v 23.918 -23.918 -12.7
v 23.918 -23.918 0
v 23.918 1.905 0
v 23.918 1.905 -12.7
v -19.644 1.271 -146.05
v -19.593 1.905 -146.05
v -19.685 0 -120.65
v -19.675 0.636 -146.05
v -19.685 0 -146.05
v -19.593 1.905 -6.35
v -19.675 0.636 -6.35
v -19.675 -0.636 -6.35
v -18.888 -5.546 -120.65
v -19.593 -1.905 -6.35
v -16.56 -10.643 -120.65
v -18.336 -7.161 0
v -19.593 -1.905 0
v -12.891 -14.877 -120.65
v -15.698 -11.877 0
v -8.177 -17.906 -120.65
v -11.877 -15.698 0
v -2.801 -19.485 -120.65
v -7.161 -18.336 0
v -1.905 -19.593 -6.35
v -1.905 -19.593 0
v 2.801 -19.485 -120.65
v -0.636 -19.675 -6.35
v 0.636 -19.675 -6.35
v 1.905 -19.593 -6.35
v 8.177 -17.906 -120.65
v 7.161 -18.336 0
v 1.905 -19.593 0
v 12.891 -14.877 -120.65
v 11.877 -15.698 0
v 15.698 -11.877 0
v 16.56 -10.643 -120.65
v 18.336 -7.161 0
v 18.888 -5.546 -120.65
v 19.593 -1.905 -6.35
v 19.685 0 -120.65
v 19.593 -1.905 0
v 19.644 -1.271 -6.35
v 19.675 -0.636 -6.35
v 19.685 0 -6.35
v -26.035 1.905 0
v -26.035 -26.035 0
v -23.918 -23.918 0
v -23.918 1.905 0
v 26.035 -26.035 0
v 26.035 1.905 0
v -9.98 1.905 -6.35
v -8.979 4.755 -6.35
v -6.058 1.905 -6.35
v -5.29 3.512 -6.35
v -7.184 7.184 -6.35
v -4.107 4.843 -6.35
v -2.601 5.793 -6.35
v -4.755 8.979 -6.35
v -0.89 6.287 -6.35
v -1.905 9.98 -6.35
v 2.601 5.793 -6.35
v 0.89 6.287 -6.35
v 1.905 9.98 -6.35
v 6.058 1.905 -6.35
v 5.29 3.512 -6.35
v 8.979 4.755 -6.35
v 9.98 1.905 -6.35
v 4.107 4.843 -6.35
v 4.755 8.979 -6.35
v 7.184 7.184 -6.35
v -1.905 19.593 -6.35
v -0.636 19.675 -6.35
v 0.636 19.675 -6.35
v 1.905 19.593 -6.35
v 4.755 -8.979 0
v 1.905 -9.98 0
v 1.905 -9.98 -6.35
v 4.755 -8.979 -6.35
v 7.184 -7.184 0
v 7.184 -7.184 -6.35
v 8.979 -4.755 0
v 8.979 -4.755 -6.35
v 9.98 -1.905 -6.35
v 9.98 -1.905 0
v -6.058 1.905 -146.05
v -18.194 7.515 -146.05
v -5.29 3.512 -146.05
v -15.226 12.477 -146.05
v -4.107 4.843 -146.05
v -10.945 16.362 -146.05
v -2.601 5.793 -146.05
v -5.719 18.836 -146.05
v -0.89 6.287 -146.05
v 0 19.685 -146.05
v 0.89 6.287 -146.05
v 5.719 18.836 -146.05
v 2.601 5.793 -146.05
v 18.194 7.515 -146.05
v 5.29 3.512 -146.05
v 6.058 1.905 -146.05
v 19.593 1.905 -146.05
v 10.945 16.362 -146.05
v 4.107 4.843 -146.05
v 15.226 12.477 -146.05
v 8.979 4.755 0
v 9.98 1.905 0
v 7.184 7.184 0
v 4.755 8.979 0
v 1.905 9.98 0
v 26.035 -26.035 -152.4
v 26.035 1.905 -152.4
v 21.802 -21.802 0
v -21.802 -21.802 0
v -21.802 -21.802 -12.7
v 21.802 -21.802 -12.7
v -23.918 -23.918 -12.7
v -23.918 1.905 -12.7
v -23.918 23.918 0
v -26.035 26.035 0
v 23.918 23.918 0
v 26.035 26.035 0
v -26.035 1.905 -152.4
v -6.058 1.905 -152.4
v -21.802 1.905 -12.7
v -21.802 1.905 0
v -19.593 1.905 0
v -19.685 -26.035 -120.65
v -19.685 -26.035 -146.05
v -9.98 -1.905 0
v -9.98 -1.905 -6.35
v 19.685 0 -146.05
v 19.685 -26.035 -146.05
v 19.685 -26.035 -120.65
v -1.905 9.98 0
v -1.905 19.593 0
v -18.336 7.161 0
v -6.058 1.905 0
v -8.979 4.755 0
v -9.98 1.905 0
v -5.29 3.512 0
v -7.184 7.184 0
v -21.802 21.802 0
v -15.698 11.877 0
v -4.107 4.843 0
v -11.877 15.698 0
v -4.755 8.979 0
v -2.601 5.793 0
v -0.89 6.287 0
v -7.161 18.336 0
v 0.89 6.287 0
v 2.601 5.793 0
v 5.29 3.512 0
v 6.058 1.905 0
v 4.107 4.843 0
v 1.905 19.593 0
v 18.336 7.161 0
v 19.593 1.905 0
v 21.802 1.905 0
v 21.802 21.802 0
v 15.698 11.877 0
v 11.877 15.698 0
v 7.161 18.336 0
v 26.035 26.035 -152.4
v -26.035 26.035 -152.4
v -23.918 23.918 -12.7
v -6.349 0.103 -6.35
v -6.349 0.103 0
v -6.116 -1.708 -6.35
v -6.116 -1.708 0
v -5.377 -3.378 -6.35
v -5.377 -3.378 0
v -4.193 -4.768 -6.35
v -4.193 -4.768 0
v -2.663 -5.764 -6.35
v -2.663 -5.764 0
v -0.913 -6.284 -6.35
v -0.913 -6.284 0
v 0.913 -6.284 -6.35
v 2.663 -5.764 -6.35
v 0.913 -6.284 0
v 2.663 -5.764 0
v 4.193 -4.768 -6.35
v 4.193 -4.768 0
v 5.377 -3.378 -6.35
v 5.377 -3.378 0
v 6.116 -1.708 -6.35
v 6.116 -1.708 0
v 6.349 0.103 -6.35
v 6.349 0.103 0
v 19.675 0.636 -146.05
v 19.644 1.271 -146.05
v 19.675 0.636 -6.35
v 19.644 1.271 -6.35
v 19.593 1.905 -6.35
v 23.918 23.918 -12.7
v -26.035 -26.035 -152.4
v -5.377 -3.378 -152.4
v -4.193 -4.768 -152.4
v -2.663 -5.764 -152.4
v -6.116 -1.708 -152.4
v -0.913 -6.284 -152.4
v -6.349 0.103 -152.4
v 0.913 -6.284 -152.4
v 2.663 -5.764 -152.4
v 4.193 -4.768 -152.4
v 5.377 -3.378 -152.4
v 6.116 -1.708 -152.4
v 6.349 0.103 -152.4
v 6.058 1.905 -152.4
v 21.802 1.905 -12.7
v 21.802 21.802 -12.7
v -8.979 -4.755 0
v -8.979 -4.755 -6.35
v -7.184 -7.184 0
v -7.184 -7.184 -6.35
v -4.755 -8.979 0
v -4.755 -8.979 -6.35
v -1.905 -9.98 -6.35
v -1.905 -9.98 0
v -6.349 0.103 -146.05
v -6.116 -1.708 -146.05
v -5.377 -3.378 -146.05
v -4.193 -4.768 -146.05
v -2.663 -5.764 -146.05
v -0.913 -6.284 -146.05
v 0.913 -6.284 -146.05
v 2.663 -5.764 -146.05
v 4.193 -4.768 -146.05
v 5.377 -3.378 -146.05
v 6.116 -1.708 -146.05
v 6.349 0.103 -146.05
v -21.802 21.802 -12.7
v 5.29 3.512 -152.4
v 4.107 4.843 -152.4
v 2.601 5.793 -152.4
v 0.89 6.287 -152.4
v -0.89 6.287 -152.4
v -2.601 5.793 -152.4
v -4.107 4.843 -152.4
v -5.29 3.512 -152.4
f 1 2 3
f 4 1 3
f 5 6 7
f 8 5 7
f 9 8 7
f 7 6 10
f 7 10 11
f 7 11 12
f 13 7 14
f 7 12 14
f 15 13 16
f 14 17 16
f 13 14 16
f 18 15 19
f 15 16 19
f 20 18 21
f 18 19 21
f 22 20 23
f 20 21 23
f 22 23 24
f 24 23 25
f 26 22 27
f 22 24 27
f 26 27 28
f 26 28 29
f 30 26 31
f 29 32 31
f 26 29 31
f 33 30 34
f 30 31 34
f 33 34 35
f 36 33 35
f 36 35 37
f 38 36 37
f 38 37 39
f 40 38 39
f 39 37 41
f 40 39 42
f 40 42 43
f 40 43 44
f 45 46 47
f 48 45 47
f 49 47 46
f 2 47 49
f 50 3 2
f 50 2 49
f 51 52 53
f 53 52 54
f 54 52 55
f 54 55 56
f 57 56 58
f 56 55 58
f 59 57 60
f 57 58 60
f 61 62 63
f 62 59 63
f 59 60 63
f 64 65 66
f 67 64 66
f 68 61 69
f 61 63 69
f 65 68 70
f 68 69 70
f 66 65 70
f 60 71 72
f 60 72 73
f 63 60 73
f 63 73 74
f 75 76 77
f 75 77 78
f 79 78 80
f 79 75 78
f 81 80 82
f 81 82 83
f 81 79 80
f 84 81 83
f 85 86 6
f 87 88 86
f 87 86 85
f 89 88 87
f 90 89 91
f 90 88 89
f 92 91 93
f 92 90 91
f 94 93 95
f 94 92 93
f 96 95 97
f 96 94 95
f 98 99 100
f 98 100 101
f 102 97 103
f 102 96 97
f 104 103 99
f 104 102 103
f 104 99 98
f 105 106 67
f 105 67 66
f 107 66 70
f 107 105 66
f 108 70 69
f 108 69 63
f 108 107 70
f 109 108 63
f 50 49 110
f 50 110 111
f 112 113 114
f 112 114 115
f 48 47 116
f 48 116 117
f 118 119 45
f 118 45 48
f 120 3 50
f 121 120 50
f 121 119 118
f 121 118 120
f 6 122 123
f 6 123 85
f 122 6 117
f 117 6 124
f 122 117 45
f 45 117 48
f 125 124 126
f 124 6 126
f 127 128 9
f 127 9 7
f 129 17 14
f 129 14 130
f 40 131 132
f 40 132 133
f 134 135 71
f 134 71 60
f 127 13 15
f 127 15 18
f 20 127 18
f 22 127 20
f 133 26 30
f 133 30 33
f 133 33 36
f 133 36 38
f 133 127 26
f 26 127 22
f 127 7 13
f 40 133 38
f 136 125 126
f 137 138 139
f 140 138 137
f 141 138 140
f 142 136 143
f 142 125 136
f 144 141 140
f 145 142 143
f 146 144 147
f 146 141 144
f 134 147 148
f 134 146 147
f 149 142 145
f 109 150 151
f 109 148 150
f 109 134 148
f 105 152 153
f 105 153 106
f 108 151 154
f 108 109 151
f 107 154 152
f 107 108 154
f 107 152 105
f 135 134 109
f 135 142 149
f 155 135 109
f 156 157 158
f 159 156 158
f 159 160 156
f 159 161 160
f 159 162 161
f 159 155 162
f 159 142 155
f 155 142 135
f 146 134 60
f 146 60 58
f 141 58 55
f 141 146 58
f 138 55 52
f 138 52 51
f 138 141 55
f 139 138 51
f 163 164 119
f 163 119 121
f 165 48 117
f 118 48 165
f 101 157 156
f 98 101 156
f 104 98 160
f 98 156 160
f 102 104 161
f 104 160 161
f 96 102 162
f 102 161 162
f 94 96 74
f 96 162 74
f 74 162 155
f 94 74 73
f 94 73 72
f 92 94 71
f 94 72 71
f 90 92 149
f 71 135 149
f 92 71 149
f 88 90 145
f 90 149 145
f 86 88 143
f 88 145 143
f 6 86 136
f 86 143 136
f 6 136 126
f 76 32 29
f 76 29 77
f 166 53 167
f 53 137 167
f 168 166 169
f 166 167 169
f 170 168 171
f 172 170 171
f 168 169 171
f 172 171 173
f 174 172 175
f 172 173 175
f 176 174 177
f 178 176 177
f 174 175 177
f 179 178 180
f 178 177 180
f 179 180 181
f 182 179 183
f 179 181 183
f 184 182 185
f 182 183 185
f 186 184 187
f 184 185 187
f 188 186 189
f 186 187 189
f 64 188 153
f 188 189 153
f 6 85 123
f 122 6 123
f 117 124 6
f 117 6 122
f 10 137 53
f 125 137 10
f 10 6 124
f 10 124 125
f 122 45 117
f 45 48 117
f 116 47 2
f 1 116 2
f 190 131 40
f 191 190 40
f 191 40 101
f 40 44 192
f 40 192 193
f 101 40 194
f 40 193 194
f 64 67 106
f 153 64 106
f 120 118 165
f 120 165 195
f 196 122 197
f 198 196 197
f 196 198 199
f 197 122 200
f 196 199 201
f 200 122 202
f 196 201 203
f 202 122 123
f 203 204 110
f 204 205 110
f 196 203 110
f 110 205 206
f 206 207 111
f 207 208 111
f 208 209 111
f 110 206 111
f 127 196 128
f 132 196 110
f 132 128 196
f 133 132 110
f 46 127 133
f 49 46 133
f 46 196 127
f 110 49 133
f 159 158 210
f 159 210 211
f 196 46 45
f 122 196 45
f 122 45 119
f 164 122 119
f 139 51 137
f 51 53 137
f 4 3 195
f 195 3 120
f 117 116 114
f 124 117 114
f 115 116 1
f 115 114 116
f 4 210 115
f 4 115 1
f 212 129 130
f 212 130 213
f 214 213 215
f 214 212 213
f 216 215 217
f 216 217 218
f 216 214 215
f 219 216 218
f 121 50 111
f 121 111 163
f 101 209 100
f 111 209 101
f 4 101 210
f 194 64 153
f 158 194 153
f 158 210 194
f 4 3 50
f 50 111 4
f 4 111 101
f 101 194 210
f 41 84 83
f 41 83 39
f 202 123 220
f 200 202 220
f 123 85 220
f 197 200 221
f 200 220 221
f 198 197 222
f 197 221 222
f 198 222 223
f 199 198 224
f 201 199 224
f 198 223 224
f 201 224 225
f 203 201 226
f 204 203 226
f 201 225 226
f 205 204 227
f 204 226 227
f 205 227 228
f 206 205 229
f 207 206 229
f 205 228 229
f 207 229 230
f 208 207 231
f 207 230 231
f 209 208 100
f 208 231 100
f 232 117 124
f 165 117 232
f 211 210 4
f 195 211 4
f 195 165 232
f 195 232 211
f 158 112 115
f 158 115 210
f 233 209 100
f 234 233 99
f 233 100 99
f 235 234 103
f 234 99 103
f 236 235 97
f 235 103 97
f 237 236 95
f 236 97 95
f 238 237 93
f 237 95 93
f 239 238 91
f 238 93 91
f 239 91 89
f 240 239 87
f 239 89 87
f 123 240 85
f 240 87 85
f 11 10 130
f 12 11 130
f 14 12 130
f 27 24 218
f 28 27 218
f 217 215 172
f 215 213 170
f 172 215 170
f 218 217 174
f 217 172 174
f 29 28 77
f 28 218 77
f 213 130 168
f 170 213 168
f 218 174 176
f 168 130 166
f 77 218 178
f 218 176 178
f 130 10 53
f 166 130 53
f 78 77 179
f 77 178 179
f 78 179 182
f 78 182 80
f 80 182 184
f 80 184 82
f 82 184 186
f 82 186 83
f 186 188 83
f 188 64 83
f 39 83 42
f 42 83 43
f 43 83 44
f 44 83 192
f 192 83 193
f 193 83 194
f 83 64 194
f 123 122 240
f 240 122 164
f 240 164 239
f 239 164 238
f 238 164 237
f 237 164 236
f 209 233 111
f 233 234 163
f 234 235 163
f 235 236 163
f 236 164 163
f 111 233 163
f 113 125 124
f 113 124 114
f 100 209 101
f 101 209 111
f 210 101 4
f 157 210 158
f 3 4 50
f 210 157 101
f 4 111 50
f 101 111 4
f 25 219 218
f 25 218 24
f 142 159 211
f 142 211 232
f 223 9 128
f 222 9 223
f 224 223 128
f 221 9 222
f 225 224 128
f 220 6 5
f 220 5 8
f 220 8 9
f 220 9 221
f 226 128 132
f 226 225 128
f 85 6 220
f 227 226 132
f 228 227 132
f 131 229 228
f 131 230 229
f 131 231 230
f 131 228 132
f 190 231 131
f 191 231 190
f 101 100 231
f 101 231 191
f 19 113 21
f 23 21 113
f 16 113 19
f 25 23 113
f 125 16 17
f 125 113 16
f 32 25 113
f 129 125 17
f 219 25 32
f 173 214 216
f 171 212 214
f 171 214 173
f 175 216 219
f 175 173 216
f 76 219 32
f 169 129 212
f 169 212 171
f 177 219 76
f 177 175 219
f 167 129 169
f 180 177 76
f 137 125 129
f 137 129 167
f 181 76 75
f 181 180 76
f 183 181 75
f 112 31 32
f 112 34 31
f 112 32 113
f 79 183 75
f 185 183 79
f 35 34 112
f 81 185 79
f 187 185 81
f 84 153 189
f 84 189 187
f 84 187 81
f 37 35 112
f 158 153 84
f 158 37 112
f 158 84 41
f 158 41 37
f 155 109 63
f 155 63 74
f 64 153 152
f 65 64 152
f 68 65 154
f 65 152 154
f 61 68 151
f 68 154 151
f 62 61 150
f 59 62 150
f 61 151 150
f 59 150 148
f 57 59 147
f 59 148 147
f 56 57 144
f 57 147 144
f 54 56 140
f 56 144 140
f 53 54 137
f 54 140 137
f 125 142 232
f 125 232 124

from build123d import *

# Parameters (mm, degrees)
SKETCH2_W           = 52.07
SKETCH2_H           = 52.07
BOSS_EXTRUDE1_DEPTH = 152.4
SKETCH3_W           = 47.8366836
SKETCH3_H           = 47.8366836
SKETCH3_W_2         = 43.6035196
SKETCH3_H_2         = 43.6035196
CUT_EXTRUDE1_DEPTH  = 12.7
SKETCH4_R           = 19.685
CUT_EXTRUDE2_DEPTH  = 146.05
BOSS_EXTRUDE2_DEPTH = 6.35
SKETCH6_R           = 6.35
CUT_EXTRUDE3_DEPTH  = 157.78457338
SKETCH7_W           = 39.37
SKETCH7_H           = 25.4
CUT_EXTRUDE4_DEPTH  = 26.035


with BuildPart() as part:
    # Sketch2 → Boss-Extrude1 (new body)
    with BuildSketch(Plane.XY):
        Rectangle(SKETCH2_W, SKETCH2_H)
    extrude(amount=-BOSS_EXTRUDE1_DEPTH)

    # Sketch3 → Cut-Extrude1 (cut)
    with BuildSketch(Plane.XY):
        Rectangle(SKETCH3_W, SKETCH3_H)
        Rectangle(SKETCH3_W_2, SKETCH3_H_2, mode=Mode.SUBTRACT)
    extrude(amount=-CUT_EXTRUDE1_DEPTH, mode=Mode.SUBTRACT)

    # Sketch4 → Cut-Extrude2 (cut)
    with BuildSketch(Plane.XY):
        Circle(SKETCH4_R)
    extrude(amount=-CUT_EXTRUDE2_DEPTH, mode=Mode.SUBTRACT)

    # Sketch5 → Boss-Extrude2 (add)
    with BuildSketch(Plane.XY):
        with BuildLine():
            ThreePointArc((-19.592605748, -1.905), (-19.685, 0), (-19.592605748, 1.905))
            Line((-19.592605748, 1.905), (-21.8017598, 1.905))
            Line((-21.8017598, 1.905), (-21.8017598, -1.905))
            Line((-21.8017598, -1.905), (-19.592605748, -1.905))
        make_face()
        with BuildLine():
            Line((-9.979808365, 1.905), (-19.592605748, 1.905))
            ThreePointArc((-19.592605748, 1.905), (-19.685, 0), (-19.592605748, -1.905))
            Line((-19.592605748, -1.905), (-9.979808365, -1.905))
            ThreePointArc((-9.979808365, -1.905), (-10.16, 0), (-9.979808365, 1.905))
        make_face()
        with BuildLine():
            Line((-1.905, -1.905), (-1.905, 1.905))
            Line((-1.905, 1.905), (-9.979808365, 1.905))
            ThreePointArc((-9.979808365, 1.905), (-10.16, 0), (-9.979808365, -1.905))
            Line((-9.979808365, -1.905), (-1.905, -1.905))
        make_face()
        with BuildLine():
            Line((-1.905, -9.979808365), (-1.905, -1.905))
            Line((-1.905, -1.905), (-9.979808365, -1.905))
            ThreePointArc((-9.979808365, -1.905), (-7.184204897, -7.184204897), (-1.905, -9.979808365))
        make_face()
        with BuildLine():
            Line((1.905, -1.905), (-1.905, -1.905))
            Line((-1.905, -1.905), (-1.905, -9.979808365))
            ThreePointArc((-1.905, -9.979808365), (0, -10.16), (1.905, -9.979808365))
            Line((1.905, -9.979808365), (1.905, -1.905))
        make_face()
        with BuildLine():
            Line((9.979808365, -1.905), (1.905, -1.905))
            Line((1.905, -1.905), (1.905, -9.979808365))
            ThreePointArc((1.905, -9.979808365), (7.184204897, -7.184204897), (9.979808365, -1.905))
        make_face()
        with BuildLine():
            Line((9.979808365, 1.905), (1.905, 1.905))
            Line((1.905, 1.905), (1.905, -1.905))
            Line((1.905, -1.905), (9.979808365, -1.905))
            ThreePointArc((9.979808365, -1.905), (10.114851778, -0.956751538), (10.16, 0))
            ThreePointArc((10.16, 0), (10.114851778, 0.956751538), (9.979808365, 1.905))
        make_face()
        with BuildLine():
            ThreePointArc((9.979808365, 1.905), (7.184204897, 7.184204897), (1.905, 9.979808365))
            Line((1.905, 9.979808365), (1.905, 1.905))
            Line((1.905, 1.905), (9.979808365, 1.905))
        make_face()
        with BuildLine():
            ThreePointArc((1.905, 9.979808365), (0, 10.16), (-1.905, 9.979808365))
            Line((-1.905, 9.979808365), (-1.905, 1.905))
            Line((-1.905, 1.905), (1.905, 1.905))
            Line((1.905, 1.905), (1.905, 9.979808365))
        make_face()
        with BuildLine():
            Line((-1.905, 1.905), (-1.905, 9.979808365))
            ThreePointArc((-1.905, 9.979808365), (-7.184204897, 7.184204897), (-9.979808365, 1.905))
            Line((-9.979808365, 1.905), (-1.905, 1.905))
        make_face()
        with BuildLine():
            ThreePointArc((1.905, 19.592605748), (0, 19.685), (-1.905, 19.592605748))
            Line((-1.905, 19.592605748), (-1.905, 9.979808365))
            ThreePointArc((-1.905, 9.979808365), (0, 10.16), (1.905, 9.979808365))
            Line((1.905, 9.979808365), (1.905, 19.592605748))
        make_face()
        with BuildLine():
            Line((1.905, 21.8017598), (-1.905, 21.8017598))
            Line((-1.905, 21.8017598), (-1.905, 19.592605748))
            ThreePointArc((-1.905, 19.592605748), (0, 19.685), (1.905, 19.592605748))
            Line((1.905, 19.592605748), (1.905, 21.8017598))
        make_face()
        with BuildLine():
            ThreePointArc((19.685, 0), (19.661887869, 0.953619643), (19.592605748, 1.905))
            Line((19.592605748, 1.905), (9.979808365, 1.905))
            ThreePointArc((9.979808365, 1.905), (10.114851778, 0.956751538), (10.16, 0))
            ThreePointArc((10.16, 0), (10.114851778, -0.956751538), (9.979808365, -1.905))
            Line((9.979808365, -1.905), (19.592605748, -1.905))
            ThreePointArc((19.592605748, -1.905), (19.661887869, -0.953619643), (19.685, 0))
        make_face()
        with BuildLine():
            Line((21.8017598, 1.905), (19.592605748, 1.905))
            ThreePointArc((19.592605748, 1.905), (19.661887869, 0.953619643), (19.685, 0))
            ThreePointArc((19.685, 0), (19.661887869, -0.953619643), (19.592605748, -1.905))
            Line((19.592605748, -1.905), (21.8017598, -1.905))
            Line((21.8017598, -1.905), (21.8017598, 1.905))
        make_face()
        with BuildLine():
            Line((-1.905, -9.979808365), (-1.905, -19.592605748))
            ThreePointArc((-1.905, -19.592605748), (0, -19.685), (1.905, -19.592605748))
            Line((1.905, -19.592605748), (1.905, -9.979808365))
            ThreePointArc((1.905, -9.979808365), (0, -10.16), (-1.905, -9.979808365))
        make_face()
        with BuildLine():
            ThreePointArc((1.905, -19.592605748), (0, -19.685), (-1.905, -19.592605748))
            Line((-1.905, -19.592605748), (-1.905, -21.8017598))
            Line((-1.905, -21.8017598), (1.905, -21.8017598))
            Line((1.905, -21.8017598), (1.905, -19.592605748))
        make_face()
    extrude(amount=-BOSS_EXTRUDE2_DEPTH)

    # Sketch6 → Cut-Extrude3 (cut, through all)
    with BuildSketch(Plane.XY):
        Circle(SKETCH6_R)
    extrude(amount=-CUT_EXTRUDE3_DEPTH, mode=Mode.SUBTRACT)

    # Sketch7 → Cut-Extrude4 (cut)
    with BuildSketch(Plane.XZ.offset(26.035)):
        with Locations((0, -133.35)):
            Rectangle(SKETCH7_W, SKETCH7_H)
    extrude(amount=-CUT_EXTRUDE4_DEPTH, mode=Mode.SUBTRACT)


with BuildPart() as body_2:
    # Split1: the piece on the far side of the plane
    add(part.part)
    split(bisect_by=Plane.ZX.offset(1.905), keep=Keep.BOTTOM)


with BuildPart() as part_1:
    add(part.part)

    # Split1
    split(bisect_by=Plane.ZX.offset(1.905), keep=Keep.TOP)


solid = Compound([body_2.part, part_1.part])
